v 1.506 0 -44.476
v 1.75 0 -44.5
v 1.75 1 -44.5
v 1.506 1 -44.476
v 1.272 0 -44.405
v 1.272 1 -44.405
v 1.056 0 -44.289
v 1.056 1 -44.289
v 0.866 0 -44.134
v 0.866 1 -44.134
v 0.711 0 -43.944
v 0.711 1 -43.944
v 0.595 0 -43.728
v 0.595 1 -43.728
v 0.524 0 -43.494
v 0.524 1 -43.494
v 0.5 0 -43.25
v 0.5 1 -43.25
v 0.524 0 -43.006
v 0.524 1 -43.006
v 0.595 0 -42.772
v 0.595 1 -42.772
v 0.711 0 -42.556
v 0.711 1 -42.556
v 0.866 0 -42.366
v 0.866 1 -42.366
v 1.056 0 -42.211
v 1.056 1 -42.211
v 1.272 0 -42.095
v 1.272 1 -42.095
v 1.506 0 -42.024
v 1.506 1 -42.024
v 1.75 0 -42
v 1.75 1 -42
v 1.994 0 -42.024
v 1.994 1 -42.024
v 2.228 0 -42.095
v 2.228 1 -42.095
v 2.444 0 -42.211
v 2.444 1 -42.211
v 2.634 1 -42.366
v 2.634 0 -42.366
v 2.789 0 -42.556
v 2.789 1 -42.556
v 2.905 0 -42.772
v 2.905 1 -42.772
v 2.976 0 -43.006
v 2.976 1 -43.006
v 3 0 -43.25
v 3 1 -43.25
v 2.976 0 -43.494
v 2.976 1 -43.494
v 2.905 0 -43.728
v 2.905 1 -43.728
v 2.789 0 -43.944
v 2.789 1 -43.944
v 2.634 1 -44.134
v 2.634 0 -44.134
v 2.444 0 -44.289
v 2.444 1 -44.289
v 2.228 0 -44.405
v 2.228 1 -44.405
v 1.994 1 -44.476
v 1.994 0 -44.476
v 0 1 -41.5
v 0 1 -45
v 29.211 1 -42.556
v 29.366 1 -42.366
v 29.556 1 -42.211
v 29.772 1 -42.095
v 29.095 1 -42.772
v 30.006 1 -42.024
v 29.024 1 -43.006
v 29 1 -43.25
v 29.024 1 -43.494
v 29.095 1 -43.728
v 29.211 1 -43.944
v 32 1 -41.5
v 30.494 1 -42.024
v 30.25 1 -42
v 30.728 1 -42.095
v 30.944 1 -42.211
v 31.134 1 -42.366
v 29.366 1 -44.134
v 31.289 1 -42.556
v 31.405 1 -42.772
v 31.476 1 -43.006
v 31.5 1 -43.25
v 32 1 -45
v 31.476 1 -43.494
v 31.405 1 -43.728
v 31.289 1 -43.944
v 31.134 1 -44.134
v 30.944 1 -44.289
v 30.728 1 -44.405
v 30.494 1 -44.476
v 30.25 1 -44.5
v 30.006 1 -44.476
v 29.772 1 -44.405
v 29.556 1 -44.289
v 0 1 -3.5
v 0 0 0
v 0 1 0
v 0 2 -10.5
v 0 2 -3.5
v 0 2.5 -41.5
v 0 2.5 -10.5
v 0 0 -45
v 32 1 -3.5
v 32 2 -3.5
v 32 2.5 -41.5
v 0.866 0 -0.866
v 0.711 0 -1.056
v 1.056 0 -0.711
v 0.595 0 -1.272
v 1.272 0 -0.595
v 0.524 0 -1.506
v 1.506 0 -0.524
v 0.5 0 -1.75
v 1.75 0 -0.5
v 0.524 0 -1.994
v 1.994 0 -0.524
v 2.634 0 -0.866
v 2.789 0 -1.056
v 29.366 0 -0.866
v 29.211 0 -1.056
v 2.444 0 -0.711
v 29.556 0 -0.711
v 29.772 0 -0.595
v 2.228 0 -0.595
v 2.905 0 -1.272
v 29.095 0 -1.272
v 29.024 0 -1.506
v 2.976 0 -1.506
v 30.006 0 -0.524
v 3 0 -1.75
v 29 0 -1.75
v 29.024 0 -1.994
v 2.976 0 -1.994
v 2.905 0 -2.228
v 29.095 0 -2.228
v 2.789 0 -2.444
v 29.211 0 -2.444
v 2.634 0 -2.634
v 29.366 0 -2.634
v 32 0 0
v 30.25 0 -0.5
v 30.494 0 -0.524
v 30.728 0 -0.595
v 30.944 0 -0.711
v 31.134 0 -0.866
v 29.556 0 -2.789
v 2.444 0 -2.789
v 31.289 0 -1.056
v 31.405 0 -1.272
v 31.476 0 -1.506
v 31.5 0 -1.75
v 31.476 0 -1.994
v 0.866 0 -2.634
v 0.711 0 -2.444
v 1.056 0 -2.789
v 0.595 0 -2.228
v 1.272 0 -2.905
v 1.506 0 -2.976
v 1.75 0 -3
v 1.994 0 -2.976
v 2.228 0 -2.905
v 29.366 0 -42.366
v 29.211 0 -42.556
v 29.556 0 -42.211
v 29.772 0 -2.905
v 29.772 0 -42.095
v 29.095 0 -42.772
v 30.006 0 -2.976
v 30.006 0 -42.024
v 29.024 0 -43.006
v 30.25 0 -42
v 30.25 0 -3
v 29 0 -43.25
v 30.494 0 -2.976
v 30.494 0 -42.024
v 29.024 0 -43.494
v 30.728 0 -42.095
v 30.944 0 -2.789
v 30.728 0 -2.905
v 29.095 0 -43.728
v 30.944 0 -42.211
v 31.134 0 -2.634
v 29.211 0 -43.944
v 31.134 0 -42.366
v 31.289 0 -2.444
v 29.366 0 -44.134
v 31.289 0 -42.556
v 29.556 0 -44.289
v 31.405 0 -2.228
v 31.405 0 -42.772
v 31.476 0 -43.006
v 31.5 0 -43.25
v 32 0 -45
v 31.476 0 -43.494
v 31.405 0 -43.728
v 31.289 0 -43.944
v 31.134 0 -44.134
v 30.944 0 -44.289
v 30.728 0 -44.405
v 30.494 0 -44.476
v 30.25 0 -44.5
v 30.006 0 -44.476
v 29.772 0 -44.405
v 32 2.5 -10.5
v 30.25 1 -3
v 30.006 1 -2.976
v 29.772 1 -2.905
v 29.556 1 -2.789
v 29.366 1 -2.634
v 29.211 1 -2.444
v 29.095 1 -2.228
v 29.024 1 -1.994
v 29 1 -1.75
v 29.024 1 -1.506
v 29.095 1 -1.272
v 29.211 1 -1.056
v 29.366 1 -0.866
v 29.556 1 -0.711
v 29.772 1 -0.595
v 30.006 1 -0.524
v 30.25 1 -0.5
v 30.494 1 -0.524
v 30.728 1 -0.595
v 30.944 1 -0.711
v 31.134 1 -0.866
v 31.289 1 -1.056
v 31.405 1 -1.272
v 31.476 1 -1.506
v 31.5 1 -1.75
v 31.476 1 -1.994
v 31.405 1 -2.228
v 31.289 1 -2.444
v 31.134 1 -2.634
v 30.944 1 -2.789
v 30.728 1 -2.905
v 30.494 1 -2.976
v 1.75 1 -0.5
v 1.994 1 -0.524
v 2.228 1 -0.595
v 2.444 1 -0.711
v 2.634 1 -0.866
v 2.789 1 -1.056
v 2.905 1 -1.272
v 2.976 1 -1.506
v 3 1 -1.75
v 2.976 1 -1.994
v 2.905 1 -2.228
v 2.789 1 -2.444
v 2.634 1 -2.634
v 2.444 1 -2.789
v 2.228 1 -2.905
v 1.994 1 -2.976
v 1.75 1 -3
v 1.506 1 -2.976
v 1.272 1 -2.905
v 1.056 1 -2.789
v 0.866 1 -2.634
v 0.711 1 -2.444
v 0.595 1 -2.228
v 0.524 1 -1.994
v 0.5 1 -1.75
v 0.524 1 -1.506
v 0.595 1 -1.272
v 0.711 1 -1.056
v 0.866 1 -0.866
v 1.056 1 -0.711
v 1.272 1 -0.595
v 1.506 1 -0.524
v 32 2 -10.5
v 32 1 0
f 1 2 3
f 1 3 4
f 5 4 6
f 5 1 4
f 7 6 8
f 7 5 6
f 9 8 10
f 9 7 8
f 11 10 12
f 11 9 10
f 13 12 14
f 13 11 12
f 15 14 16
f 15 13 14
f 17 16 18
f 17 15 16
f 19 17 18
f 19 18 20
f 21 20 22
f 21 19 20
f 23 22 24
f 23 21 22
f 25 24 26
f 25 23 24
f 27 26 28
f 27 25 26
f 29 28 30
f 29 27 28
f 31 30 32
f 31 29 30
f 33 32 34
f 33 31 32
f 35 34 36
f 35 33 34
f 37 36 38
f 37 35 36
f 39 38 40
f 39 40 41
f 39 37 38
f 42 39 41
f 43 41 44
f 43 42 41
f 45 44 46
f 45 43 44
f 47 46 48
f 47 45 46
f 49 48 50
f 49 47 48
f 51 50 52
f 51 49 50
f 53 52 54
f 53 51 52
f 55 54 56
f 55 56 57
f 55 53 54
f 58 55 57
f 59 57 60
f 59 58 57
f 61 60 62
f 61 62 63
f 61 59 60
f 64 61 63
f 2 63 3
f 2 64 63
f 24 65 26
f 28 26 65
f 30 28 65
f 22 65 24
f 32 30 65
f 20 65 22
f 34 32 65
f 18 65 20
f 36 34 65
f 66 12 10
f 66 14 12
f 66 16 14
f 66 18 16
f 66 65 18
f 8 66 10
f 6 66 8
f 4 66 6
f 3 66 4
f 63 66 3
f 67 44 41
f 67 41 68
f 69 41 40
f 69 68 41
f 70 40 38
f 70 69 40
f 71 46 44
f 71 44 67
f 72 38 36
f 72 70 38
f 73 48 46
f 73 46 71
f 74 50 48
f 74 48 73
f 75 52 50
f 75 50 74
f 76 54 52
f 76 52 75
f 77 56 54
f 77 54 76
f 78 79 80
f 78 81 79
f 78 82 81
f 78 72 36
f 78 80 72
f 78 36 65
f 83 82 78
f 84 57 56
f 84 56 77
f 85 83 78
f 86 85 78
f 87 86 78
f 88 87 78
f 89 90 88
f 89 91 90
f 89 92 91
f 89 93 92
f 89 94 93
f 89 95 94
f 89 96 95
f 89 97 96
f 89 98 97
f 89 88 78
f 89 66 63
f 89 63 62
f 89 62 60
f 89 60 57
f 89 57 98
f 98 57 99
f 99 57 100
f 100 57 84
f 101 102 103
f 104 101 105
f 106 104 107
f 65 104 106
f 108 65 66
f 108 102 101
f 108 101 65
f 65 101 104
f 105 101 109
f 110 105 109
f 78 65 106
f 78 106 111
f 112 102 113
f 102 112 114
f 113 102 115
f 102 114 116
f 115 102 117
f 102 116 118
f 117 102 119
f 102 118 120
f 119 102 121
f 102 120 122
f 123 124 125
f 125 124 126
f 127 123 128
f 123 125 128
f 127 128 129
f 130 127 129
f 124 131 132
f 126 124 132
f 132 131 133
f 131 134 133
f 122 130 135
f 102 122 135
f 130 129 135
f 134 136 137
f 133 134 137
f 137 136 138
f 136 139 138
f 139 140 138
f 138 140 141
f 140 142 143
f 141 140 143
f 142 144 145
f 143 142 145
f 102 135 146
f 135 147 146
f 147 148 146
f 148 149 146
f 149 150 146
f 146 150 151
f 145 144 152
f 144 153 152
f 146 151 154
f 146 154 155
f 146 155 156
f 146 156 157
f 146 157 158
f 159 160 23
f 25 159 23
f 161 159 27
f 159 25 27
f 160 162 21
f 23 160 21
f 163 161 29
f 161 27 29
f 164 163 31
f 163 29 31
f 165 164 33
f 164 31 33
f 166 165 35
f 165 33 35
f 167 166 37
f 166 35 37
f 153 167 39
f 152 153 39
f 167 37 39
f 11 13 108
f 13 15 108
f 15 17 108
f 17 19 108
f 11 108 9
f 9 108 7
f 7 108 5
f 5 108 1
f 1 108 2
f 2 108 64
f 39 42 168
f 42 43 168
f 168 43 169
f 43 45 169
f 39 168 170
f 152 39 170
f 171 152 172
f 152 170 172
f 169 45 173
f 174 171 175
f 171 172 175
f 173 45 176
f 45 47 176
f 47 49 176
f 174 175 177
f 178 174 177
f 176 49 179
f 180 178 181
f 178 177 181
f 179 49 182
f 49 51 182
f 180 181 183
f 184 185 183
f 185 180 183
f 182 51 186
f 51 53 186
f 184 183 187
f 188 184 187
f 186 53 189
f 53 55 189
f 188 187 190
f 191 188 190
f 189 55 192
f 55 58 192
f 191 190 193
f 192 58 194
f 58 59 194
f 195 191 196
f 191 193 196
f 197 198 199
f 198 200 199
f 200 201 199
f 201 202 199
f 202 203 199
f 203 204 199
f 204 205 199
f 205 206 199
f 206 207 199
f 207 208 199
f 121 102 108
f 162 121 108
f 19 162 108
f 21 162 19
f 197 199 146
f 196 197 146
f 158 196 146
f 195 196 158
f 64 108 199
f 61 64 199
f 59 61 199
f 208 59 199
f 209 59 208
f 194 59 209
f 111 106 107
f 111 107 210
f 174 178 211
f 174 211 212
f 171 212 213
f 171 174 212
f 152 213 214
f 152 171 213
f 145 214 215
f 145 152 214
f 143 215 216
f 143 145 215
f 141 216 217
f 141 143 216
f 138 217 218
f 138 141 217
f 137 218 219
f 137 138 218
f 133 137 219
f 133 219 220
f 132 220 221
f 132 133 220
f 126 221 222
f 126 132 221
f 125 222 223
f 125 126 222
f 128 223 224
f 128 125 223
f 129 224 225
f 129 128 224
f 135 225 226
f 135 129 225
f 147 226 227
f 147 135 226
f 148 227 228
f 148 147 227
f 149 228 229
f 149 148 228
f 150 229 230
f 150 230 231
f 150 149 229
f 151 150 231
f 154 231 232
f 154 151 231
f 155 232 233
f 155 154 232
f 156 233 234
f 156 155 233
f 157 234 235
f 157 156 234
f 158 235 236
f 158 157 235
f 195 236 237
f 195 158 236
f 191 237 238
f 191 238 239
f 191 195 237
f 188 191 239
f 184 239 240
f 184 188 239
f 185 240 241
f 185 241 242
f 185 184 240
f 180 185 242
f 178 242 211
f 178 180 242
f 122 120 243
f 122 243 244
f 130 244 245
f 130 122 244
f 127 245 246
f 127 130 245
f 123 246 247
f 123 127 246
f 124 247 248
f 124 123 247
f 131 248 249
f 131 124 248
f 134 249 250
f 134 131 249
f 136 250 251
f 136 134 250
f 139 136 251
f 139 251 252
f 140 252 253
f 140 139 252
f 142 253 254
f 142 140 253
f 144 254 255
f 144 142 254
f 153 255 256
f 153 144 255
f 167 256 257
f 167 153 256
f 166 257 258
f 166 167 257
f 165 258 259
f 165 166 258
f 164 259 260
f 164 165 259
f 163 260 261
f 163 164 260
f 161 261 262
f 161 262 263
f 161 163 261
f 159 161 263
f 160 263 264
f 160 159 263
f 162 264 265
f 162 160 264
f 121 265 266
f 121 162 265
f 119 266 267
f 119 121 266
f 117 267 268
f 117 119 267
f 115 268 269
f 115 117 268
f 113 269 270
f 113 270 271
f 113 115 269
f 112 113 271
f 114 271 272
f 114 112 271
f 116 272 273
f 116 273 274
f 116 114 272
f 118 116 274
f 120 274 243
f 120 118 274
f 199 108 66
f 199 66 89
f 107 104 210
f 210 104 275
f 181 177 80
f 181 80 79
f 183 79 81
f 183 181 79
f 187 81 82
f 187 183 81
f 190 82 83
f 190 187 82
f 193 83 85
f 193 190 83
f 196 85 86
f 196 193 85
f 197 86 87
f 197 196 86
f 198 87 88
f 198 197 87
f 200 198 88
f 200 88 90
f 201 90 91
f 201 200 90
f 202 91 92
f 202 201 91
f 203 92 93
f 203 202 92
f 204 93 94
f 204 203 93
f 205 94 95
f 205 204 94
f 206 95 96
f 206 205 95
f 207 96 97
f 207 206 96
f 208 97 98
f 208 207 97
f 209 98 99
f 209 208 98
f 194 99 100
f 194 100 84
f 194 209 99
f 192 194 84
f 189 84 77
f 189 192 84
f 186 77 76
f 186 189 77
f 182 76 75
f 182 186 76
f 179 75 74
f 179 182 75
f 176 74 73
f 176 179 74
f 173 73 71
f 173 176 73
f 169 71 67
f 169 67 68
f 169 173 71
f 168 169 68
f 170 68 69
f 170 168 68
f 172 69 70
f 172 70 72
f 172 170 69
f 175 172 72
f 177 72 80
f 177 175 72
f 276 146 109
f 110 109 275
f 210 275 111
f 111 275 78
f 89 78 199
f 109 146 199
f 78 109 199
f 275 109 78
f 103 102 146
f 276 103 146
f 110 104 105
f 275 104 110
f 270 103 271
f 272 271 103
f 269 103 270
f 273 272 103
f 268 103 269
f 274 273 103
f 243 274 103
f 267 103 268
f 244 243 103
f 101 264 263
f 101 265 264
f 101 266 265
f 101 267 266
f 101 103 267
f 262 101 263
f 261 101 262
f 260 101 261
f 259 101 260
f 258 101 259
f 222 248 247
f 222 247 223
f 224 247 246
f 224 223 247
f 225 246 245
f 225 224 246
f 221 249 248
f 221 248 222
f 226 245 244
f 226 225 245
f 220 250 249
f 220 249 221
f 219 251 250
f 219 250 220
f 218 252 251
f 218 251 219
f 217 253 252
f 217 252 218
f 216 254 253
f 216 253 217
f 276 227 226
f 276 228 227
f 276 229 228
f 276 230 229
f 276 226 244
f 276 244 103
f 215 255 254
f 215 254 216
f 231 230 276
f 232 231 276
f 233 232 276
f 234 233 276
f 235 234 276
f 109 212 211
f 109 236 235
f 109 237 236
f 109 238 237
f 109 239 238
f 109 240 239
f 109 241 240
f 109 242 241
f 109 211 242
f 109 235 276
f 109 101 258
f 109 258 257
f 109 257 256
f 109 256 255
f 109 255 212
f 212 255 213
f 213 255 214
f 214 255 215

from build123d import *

# Parameters (mm, degrees)
SKETCH_1_W      = 32
SKETCH_1_H      = 45
SKETCH_1_R      = 1.25
EXTRUDE_1_DEPTH = 1
SKETCH_2_W      = 32
SKETCH_2_H      = 31
EXTRUDE_2_DEPTH = 1.5
SKETCH_3_W      = 32
SKETCH_3_H      = 7
EXTRUDE_3_DEPTH = 1


with BuildPart() as part:
    # 草图1 → 凸台-拉伸1 (new body)
    with BuildSketch(Plane(origin=(0, 0, 0), x_dir=(1, 0, 0), z_dir=(0, 1, 0))):
        with Locations((16, 22.5)):
            Rectangle(SKETCH_1_W, SKETCH_1_H)
        with Locations(Location((30.25, 43.25, 0), (0, 0, 270))):
            Circle(SKETCH_1_R, mode=Mode.SUBTRACT)
        with Locations(Location((30.25, 1.75, 0), (0, 0, 90))):
            Circle(SKETCH_1_R, mode=Mode.SUBTRACT)
        with Locations(Location((1.75, 1.75, 0), (0, 0, 270))):
            Circle(SKETCH_1_R, mode=Mode.SUBTRACT)
        with Locations(Location((1.75, 43.25, 0), (0, 0, 90))):
            Circle(SKETCH_1_R, mode=Mode.SUBTRACT)
    extrude(amount=EXTRUDE_1_DEPTH)

    # 草图2 → 凸台-拉伸2 (add)
    with BuildSketch(Plane(origin=(0, 1, 0), x_dir=(1, 0, 0), z_dir=(0, 1, 0))):
        with Locations((16, 26)):
            Rectangle(SKETCH_2_W, SKETCH_2_H)
    extrude(amount=EXTRUDE_2_DEPTH)

    # 草图3 → 凸台-拉伸3 (add)
    with BuildSketch(Plane(origin=(0, 1, 0), x_dir=(1, 0, 0), z_dir=(0, 1, 0))):
        with Locations((16, 7)):
            Rectangle(SKETCH_3_W, SKETCH_3_H)
    extrude(amount=EXTRUDE_3_DEPTH)


solid = part.part
